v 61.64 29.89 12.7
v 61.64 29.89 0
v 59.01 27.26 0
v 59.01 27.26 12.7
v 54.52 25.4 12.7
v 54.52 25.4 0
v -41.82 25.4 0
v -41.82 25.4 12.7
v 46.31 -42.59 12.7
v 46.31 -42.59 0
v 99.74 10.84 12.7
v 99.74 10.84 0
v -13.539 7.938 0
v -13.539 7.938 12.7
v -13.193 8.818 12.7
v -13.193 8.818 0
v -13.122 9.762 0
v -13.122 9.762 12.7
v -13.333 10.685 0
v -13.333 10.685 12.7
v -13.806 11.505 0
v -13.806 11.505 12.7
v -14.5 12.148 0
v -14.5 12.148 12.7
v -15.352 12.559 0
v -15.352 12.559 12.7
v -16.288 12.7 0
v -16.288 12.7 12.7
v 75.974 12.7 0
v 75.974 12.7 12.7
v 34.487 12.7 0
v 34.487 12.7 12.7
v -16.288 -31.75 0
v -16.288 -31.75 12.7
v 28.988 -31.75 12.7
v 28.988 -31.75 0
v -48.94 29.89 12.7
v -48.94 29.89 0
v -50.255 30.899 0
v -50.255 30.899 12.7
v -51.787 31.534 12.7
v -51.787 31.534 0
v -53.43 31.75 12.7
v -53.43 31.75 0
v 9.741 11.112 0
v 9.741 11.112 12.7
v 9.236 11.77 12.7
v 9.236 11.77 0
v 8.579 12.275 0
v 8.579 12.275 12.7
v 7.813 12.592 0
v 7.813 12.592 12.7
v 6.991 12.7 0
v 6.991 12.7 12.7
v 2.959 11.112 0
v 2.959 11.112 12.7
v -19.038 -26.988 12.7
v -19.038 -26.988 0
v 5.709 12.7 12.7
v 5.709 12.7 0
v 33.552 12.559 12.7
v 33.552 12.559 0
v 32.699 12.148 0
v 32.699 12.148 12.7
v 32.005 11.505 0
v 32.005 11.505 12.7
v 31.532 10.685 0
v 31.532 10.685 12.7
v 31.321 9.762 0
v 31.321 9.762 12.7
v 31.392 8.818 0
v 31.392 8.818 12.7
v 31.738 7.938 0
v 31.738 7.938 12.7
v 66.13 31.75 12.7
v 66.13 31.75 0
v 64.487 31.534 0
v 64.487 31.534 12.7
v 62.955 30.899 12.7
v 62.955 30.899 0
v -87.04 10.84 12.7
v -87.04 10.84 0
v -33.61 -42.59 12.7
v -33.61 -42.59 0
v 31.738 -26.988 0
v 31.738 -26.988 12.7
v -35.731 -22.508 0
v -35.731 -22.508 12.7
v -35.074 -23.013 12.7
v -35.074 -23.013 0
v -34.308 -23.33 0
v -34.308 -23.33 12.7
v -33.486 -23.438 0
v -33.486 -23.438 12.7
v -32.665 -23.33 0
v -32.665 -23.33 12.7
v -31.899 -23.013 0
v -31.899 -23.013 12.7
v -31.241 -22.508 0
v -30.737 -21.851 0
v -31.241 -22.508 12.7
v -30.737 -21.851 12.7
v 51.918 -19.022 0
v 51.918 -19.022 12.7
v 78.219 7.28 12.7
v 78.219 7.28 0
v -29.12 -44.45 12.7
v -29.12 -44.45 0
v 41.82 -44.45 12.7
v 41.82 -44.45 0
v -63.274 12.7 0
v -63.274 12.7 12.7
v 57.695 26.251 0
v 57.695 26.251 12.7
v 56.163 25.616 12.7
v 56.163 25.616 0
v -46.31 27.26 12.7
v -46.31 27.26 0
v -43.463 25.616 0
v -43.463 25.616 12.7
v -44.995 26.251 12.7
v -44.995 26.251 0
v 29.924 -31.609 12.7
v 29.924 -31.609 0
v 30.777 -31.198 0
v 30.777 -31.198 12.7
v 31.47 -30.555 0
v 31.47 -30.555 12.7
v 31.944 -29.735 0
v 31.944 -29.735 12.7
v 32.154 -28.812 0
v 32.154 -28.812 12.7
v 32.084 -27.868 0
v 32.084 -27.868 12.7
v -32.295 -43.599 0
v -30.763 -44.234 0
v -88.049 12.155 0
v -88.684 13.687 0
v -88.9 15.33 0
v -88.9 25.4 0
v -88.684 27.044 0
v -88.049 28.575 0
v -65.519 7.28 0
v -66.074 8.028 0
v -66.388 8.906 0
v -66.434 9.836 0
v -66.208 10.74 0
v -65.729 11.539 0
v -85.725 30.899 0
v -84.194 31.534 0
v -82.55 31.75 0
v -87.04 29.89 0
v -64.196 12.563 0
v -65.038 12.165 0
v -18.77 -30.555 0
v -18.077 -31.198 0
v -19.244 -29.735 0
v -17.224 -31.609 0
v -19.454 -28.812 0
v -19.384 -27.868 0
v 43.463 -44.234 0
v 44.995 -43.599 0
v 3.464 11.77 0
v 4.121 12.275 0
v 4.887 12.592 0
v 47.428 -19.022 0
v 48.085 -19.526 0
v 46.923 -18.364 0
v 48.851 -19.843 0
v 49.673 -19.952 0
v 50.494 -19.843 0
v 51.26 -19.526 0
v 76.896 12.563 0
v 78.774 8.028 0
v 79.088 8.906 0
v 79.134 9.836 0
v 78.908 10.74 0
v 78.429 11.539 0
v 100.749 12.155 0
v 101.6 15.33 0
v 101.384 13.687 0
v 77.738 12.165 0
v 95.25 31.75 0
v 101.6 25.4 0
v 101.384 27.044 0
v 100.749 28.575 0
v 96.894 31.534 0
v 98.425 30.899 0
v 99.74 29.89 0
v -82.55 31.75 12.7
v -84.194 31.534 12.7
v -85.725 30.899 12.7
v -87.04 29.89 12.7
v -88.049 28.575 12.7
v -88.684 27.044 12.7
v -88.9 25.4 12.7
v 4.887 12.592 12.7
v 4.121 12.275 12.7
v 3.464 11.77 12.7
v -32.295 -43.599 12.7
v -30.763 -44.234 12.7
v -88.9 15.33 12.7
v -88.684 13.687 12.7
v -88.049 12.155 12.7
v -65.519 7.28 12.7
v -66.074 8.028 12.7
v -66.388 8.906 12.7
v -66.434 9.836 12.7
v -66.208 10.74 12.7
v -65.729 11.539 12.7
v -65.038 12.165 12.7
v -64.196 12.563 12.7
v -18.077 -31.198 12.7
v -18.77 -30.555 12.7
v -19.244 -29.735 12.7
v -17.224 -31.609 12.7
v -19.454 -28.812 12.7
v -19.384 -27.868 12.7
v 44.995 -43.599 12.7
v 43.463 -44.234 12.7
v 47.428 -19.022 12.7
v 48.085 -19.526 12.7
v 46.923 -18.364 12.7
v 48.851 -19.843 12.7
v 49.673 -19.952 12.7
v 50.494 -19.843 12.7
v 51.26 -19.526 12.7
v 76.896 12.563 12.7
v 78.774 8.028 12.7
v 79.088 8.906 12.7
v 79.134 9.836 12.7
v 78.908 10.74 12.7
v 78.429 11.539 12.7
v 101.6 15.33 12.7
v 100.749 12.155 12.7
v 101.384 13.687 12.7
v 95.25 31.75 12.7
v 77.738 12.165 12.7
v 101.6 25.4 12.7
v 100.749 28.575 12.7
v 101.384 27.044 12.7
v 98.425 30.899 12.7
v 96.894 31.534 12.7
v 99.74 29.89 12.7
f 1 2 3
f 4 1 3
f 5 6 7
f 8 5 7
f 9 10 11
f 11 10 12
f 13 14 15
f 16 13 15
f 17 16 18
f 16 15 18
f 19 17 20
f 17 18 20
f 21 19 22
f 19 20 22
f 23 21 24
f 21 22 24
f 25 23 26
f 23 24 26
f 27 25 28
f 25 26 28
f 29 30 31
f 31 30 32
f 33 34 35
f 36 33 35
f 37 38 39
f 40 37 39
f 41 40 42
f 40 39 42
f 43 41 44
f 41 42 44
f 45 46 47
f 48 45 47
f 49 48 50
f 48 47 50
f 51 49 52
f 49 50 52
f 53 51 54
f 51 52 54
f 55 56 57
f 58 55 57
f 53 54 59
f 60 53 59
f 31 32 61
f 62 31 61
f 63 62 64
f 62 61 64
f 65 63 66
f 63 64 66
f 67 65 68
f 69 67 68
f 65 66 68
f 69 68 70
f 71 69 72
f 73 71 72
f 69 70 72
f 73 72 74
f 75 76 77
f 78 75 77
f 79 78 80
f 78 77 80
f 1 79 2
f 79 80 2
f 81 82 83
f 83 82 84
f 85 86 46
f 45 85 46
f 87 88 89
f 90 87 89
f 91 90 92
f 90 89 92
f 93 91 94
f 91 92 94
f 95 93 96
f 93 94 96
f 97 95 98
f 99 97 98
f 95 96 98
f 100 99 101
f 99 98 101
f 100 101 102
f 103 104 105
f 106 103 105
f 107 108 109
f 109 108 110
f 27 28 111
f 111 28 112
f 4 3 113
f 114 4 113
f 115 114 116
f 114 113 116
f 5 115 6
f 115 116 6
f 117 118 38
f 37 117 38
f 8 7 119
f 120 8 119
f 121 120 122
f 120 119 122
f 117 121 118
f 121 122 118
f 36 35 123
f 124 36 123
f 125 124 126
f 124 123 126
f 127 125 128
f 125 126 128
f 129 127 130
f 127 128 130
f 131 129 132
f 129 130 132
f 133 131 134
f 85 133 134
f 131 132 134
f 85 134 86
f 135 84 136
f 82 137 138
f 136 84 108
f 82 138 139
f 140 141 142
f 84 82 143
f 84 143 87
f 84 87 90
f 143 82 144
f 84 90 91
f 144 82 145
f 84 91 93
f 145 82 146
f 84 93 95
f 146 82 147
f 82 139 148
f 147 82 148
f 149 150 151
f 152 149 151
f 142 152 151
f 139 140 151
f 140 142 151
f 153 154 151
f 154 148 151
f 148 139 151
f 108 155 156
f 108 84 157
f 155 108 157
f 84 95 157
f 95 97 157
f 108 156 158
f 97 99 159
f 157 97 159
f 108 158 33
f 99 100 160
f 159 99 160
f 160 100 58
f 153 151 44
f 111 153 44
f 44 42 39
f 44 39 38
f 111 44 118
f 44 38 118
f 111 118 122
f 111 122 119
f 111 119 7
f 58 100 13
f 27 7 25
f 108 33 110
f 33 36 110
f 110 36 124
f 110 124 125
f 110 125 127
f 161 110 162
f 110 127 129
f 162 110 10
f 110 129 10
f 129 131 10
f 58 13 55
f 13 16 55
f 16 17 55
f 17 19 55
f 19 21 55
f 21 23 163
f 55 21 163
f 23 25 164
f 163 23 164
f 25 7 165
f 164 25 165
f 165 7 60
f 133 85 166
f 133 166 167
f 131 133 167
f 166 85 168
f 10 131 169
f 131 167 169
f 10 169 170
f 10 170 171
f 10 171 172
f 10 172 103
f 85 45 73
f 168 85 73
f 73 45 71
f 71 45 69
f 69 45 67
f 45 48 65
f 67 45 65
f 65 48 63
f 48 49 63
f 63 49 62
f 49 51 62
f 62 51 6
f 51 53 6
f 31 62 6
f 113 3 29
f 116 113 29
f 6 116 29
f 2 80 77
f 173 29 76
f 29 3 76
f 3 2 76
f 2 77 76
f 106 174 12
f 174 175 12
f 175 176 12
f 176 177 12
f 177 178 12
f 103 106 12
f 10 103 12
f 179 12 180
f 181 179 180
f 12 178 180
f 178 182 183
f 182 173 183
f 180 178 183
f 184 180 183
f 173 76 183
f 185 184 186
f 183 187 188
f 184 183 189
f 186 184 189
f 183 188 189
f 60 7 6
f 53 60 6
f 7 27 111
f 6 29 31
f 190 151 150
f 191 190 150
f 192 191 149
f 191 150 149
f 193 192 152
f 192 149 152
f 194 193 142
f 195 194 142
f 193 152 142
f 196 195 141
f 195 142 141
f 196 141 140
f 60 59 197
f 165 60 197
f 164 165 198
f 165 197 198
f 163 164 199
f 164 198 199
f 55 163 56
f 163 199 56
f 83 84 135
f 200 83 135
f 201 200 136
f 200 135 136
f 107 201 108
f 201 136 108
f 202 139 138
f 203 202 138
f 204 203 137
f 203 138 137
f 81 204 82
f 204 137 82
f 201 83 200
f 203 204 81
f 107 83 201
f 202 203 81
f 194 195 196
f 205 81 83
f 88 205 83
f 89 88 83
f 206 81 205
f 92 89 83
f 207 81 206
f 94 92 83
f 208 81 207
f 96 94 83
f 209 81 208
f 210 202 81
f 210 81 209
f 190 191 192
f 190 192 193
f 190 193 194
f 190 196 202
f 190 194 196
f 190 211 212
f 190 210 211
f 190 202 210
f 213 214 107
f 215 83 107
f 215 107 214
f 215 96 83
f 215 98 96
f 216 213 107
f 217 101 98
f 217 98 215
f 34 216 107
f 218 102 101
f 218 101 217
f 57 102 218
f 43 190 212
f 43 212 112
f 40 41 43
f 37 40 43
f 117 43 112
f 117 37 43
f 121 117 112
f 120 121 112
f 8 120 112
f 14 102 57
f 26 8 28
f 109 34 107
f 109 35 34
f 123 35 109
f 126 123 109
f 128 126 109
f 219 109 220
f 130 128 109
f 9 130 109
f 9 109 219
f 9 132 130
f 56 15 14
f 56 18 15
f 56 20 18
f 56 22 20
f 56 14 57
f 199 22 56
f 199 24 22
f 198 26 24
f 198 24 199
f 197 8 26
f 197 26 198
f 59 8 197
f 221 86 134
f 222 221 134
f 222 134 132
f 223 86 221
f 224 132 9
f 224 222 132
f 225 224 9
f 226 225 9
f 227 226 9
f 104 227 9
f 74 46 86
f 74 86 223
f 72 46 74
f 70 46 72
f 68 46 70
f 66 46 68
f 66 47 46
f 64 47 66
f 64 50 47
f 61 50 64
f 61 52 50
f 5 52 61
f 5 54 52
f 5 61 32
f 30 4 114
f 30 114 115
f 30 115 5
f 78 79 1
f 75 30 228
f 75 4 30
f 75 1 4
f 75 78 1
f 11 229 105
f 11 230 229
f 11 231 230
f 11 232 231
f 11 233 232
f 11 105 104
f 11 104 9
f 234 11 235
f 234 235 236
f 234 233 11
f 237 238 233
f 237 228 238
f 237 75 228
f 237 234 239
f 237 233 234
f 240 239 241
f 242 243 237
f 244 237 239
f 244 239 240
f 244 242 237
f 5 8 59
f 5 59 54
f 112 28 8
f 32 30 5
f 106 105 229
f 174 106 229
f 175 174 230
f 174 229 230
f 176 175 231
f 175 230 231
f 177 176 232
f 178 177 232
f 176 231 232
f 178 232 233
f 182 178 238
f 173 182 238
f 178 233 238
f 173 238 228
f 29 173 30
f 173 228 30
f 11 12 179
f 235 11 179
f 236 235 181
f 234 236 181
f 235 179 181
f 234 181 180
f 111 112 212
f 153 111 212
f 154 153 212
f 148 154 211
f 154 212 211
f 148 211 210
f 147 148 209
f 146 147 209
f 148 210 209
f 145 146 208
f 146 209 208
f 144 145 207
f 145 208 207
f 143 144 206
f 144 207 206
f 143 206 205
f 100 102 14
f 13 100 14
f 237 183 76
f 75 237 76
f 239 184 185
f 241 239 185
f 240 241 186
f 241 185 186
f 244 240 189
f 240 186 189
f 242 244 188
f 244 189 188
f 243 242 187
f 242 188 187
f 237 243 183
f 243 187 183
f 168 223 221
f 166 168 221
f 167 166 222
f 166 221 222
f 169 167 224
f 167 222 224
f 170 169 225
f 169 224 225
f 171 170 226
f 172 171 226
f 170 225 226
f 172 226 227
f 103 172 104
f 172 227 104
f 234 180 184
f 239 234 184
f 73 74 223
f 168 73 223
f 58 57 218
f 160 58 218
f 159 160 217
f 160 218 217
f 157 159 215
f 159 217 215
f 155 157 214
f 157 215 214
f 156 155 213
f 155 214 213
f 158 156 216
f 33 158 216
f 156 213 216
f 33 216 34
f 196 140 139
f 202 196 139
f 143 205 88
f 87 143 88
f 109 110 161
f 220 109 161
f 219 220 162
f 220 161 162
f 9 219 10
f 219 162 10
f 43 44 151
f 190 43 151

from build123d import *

# Parameters (mm, degrees)
F1_DEPTH = 12.7
F3_DEPTH = 12.701


with BuildPart() as f1:
    # F0 (on Top) → F1 (new body)
    with BuildSketch(Plane.XY):
        with BuildLine():
            Line((-53.430256, 31.75), (-82.55, 31.75))
            ThreePointArc((-82.55, 31.75), (-87.040128, 29.890128), (-88.9, 25.4))
            Line((-88.9, 25.4), (-88.9, 15.330256))
            ThreePointArc((-88.9, 15.330256), (-88.416635, 12.900216), (-87.040128, 10.840128))
            Line((-87.040128, 10.840128), (-33.609872, -42.590128))
            ThreePointArc((-33.609872, -42.590128), (-31.549784, -43.966635), (-29.119744, -44.45))
            Line((-29.119744, -44.45), (41.819744, -44.45))
            ThreePointArc((41.819744, -44.45), (44.249784, -43.966635), (46.309872, -42.590128))
            Line((46.309872, -42.590128), (99.740128, 10.840128))
            ThreePointArc((99.740128, 10.840128), (101.116635, 12.900216), (101.6, 15.330256))
            Line((101.6, 15.330256), (101.6, 25.4))
            ThreePointArc((101.6, 25.4), (99.740128, 29.890128), (95.25, 31.75))
            Line((95.25, 31.75), (66.130256, 31.75))
            ThreePointArc((66.130256, 31.75), (63.700216, 31.266635), (61.640128, 29.890128))
            Line((61.640128, 29.890128), (59.009872, 27.259872))
            ThreePointArc((59.009872, 27.259872), (56.949784, 25.883365), (54.519744, 25.4))
            Line((54.519744, 25.4), (-41.819744, 25.4))
            ThreePointArc((-41.819744, 25.4), (-44.249784, 25.883365), (-46.309872, 27.259872))
            Line((-46.309872, 27.259872), (-48.940128, 29.890128))
            ThreePointArc((-48.940128, 29.890128), (-51.000216, 31.266635), (-53.430256, 31.75))
        make_face()
    extrude(amount=F1_DEPTH)

    # F2 (on face) → F3 (cut, through all)
    with BuildSketch(Plane.XY.offset(12.7)):
        with BuildLine():
            ThreePointArc((5.708911, 12.7), (4.121411, 12.274631), (2.95928, 11.1125))
            Line((2.95928, 11.1125), (-19.037765, -26.9875))
            ThreePointArc((-19.037765, -26.9875), (-19.037765, -30.1625), (-16.288134, -31.75))
            Line((-16.288134, -31.75), (28.988134, -31.75))
            ThreePointArc((28.988134, -31.75), (31.737765, -30.1625), (31.737765, -26.9875))
            Line((31.737765, -26.9875), (9.74072, 11.1125))
            ThreePointArc((9.74072, 11.1125), (8.578589, 12.274631), (6.991089, 12.7))
            Line((6.991089, 12.7), (5.708911, 12.7))
        make_face()
        with BuildLine():
            ThreePointArc((34.487395, 12.7), (31.737765, 11.1125), (31.737765, 7.9375))
            Line((31.737765, 7.9375), (46.923048, -18.364181))
            ThreePointArc((46.923048, -18.364181), (49.258258, -19.924519), (51.917742, -19.021745))
            Line((51.917742, -19.021745), (78.219424, 7.279936))
            ThreePointArc((78.219424, 7.279936), (78.907677, 10.74002), (75.97436, 12.7))
            Line((75.97436, 12.7), (34.487395, 12.7))
        make_face()
        with BuildLine():
            ThreePointArc((-63.27436, 12.7), (-66.207677, 10.74002), (-65.519424, 7.279936))
            Line((-65.519424, 7.279936), (-35.73135, -22.508137))
            ThreePointArc((-35.73135, -22.508137), (-33.071866, -23.410911), (-30.736656, -21.850573))
            Line((-30.736656, -21.850573), (-13.538503, 7.9375))
            ThreePointArc((-13.538503, 7.9375), (-13.538503, 11.1125), (-16.288134, 12.7))
            Line((-16.288134, 12.7), (-63.27436, 12.7))
        make_face()
    extrude(amount=-F3_DEPTH, mode=Mode.SUBTRACT)


solid = f1.part
